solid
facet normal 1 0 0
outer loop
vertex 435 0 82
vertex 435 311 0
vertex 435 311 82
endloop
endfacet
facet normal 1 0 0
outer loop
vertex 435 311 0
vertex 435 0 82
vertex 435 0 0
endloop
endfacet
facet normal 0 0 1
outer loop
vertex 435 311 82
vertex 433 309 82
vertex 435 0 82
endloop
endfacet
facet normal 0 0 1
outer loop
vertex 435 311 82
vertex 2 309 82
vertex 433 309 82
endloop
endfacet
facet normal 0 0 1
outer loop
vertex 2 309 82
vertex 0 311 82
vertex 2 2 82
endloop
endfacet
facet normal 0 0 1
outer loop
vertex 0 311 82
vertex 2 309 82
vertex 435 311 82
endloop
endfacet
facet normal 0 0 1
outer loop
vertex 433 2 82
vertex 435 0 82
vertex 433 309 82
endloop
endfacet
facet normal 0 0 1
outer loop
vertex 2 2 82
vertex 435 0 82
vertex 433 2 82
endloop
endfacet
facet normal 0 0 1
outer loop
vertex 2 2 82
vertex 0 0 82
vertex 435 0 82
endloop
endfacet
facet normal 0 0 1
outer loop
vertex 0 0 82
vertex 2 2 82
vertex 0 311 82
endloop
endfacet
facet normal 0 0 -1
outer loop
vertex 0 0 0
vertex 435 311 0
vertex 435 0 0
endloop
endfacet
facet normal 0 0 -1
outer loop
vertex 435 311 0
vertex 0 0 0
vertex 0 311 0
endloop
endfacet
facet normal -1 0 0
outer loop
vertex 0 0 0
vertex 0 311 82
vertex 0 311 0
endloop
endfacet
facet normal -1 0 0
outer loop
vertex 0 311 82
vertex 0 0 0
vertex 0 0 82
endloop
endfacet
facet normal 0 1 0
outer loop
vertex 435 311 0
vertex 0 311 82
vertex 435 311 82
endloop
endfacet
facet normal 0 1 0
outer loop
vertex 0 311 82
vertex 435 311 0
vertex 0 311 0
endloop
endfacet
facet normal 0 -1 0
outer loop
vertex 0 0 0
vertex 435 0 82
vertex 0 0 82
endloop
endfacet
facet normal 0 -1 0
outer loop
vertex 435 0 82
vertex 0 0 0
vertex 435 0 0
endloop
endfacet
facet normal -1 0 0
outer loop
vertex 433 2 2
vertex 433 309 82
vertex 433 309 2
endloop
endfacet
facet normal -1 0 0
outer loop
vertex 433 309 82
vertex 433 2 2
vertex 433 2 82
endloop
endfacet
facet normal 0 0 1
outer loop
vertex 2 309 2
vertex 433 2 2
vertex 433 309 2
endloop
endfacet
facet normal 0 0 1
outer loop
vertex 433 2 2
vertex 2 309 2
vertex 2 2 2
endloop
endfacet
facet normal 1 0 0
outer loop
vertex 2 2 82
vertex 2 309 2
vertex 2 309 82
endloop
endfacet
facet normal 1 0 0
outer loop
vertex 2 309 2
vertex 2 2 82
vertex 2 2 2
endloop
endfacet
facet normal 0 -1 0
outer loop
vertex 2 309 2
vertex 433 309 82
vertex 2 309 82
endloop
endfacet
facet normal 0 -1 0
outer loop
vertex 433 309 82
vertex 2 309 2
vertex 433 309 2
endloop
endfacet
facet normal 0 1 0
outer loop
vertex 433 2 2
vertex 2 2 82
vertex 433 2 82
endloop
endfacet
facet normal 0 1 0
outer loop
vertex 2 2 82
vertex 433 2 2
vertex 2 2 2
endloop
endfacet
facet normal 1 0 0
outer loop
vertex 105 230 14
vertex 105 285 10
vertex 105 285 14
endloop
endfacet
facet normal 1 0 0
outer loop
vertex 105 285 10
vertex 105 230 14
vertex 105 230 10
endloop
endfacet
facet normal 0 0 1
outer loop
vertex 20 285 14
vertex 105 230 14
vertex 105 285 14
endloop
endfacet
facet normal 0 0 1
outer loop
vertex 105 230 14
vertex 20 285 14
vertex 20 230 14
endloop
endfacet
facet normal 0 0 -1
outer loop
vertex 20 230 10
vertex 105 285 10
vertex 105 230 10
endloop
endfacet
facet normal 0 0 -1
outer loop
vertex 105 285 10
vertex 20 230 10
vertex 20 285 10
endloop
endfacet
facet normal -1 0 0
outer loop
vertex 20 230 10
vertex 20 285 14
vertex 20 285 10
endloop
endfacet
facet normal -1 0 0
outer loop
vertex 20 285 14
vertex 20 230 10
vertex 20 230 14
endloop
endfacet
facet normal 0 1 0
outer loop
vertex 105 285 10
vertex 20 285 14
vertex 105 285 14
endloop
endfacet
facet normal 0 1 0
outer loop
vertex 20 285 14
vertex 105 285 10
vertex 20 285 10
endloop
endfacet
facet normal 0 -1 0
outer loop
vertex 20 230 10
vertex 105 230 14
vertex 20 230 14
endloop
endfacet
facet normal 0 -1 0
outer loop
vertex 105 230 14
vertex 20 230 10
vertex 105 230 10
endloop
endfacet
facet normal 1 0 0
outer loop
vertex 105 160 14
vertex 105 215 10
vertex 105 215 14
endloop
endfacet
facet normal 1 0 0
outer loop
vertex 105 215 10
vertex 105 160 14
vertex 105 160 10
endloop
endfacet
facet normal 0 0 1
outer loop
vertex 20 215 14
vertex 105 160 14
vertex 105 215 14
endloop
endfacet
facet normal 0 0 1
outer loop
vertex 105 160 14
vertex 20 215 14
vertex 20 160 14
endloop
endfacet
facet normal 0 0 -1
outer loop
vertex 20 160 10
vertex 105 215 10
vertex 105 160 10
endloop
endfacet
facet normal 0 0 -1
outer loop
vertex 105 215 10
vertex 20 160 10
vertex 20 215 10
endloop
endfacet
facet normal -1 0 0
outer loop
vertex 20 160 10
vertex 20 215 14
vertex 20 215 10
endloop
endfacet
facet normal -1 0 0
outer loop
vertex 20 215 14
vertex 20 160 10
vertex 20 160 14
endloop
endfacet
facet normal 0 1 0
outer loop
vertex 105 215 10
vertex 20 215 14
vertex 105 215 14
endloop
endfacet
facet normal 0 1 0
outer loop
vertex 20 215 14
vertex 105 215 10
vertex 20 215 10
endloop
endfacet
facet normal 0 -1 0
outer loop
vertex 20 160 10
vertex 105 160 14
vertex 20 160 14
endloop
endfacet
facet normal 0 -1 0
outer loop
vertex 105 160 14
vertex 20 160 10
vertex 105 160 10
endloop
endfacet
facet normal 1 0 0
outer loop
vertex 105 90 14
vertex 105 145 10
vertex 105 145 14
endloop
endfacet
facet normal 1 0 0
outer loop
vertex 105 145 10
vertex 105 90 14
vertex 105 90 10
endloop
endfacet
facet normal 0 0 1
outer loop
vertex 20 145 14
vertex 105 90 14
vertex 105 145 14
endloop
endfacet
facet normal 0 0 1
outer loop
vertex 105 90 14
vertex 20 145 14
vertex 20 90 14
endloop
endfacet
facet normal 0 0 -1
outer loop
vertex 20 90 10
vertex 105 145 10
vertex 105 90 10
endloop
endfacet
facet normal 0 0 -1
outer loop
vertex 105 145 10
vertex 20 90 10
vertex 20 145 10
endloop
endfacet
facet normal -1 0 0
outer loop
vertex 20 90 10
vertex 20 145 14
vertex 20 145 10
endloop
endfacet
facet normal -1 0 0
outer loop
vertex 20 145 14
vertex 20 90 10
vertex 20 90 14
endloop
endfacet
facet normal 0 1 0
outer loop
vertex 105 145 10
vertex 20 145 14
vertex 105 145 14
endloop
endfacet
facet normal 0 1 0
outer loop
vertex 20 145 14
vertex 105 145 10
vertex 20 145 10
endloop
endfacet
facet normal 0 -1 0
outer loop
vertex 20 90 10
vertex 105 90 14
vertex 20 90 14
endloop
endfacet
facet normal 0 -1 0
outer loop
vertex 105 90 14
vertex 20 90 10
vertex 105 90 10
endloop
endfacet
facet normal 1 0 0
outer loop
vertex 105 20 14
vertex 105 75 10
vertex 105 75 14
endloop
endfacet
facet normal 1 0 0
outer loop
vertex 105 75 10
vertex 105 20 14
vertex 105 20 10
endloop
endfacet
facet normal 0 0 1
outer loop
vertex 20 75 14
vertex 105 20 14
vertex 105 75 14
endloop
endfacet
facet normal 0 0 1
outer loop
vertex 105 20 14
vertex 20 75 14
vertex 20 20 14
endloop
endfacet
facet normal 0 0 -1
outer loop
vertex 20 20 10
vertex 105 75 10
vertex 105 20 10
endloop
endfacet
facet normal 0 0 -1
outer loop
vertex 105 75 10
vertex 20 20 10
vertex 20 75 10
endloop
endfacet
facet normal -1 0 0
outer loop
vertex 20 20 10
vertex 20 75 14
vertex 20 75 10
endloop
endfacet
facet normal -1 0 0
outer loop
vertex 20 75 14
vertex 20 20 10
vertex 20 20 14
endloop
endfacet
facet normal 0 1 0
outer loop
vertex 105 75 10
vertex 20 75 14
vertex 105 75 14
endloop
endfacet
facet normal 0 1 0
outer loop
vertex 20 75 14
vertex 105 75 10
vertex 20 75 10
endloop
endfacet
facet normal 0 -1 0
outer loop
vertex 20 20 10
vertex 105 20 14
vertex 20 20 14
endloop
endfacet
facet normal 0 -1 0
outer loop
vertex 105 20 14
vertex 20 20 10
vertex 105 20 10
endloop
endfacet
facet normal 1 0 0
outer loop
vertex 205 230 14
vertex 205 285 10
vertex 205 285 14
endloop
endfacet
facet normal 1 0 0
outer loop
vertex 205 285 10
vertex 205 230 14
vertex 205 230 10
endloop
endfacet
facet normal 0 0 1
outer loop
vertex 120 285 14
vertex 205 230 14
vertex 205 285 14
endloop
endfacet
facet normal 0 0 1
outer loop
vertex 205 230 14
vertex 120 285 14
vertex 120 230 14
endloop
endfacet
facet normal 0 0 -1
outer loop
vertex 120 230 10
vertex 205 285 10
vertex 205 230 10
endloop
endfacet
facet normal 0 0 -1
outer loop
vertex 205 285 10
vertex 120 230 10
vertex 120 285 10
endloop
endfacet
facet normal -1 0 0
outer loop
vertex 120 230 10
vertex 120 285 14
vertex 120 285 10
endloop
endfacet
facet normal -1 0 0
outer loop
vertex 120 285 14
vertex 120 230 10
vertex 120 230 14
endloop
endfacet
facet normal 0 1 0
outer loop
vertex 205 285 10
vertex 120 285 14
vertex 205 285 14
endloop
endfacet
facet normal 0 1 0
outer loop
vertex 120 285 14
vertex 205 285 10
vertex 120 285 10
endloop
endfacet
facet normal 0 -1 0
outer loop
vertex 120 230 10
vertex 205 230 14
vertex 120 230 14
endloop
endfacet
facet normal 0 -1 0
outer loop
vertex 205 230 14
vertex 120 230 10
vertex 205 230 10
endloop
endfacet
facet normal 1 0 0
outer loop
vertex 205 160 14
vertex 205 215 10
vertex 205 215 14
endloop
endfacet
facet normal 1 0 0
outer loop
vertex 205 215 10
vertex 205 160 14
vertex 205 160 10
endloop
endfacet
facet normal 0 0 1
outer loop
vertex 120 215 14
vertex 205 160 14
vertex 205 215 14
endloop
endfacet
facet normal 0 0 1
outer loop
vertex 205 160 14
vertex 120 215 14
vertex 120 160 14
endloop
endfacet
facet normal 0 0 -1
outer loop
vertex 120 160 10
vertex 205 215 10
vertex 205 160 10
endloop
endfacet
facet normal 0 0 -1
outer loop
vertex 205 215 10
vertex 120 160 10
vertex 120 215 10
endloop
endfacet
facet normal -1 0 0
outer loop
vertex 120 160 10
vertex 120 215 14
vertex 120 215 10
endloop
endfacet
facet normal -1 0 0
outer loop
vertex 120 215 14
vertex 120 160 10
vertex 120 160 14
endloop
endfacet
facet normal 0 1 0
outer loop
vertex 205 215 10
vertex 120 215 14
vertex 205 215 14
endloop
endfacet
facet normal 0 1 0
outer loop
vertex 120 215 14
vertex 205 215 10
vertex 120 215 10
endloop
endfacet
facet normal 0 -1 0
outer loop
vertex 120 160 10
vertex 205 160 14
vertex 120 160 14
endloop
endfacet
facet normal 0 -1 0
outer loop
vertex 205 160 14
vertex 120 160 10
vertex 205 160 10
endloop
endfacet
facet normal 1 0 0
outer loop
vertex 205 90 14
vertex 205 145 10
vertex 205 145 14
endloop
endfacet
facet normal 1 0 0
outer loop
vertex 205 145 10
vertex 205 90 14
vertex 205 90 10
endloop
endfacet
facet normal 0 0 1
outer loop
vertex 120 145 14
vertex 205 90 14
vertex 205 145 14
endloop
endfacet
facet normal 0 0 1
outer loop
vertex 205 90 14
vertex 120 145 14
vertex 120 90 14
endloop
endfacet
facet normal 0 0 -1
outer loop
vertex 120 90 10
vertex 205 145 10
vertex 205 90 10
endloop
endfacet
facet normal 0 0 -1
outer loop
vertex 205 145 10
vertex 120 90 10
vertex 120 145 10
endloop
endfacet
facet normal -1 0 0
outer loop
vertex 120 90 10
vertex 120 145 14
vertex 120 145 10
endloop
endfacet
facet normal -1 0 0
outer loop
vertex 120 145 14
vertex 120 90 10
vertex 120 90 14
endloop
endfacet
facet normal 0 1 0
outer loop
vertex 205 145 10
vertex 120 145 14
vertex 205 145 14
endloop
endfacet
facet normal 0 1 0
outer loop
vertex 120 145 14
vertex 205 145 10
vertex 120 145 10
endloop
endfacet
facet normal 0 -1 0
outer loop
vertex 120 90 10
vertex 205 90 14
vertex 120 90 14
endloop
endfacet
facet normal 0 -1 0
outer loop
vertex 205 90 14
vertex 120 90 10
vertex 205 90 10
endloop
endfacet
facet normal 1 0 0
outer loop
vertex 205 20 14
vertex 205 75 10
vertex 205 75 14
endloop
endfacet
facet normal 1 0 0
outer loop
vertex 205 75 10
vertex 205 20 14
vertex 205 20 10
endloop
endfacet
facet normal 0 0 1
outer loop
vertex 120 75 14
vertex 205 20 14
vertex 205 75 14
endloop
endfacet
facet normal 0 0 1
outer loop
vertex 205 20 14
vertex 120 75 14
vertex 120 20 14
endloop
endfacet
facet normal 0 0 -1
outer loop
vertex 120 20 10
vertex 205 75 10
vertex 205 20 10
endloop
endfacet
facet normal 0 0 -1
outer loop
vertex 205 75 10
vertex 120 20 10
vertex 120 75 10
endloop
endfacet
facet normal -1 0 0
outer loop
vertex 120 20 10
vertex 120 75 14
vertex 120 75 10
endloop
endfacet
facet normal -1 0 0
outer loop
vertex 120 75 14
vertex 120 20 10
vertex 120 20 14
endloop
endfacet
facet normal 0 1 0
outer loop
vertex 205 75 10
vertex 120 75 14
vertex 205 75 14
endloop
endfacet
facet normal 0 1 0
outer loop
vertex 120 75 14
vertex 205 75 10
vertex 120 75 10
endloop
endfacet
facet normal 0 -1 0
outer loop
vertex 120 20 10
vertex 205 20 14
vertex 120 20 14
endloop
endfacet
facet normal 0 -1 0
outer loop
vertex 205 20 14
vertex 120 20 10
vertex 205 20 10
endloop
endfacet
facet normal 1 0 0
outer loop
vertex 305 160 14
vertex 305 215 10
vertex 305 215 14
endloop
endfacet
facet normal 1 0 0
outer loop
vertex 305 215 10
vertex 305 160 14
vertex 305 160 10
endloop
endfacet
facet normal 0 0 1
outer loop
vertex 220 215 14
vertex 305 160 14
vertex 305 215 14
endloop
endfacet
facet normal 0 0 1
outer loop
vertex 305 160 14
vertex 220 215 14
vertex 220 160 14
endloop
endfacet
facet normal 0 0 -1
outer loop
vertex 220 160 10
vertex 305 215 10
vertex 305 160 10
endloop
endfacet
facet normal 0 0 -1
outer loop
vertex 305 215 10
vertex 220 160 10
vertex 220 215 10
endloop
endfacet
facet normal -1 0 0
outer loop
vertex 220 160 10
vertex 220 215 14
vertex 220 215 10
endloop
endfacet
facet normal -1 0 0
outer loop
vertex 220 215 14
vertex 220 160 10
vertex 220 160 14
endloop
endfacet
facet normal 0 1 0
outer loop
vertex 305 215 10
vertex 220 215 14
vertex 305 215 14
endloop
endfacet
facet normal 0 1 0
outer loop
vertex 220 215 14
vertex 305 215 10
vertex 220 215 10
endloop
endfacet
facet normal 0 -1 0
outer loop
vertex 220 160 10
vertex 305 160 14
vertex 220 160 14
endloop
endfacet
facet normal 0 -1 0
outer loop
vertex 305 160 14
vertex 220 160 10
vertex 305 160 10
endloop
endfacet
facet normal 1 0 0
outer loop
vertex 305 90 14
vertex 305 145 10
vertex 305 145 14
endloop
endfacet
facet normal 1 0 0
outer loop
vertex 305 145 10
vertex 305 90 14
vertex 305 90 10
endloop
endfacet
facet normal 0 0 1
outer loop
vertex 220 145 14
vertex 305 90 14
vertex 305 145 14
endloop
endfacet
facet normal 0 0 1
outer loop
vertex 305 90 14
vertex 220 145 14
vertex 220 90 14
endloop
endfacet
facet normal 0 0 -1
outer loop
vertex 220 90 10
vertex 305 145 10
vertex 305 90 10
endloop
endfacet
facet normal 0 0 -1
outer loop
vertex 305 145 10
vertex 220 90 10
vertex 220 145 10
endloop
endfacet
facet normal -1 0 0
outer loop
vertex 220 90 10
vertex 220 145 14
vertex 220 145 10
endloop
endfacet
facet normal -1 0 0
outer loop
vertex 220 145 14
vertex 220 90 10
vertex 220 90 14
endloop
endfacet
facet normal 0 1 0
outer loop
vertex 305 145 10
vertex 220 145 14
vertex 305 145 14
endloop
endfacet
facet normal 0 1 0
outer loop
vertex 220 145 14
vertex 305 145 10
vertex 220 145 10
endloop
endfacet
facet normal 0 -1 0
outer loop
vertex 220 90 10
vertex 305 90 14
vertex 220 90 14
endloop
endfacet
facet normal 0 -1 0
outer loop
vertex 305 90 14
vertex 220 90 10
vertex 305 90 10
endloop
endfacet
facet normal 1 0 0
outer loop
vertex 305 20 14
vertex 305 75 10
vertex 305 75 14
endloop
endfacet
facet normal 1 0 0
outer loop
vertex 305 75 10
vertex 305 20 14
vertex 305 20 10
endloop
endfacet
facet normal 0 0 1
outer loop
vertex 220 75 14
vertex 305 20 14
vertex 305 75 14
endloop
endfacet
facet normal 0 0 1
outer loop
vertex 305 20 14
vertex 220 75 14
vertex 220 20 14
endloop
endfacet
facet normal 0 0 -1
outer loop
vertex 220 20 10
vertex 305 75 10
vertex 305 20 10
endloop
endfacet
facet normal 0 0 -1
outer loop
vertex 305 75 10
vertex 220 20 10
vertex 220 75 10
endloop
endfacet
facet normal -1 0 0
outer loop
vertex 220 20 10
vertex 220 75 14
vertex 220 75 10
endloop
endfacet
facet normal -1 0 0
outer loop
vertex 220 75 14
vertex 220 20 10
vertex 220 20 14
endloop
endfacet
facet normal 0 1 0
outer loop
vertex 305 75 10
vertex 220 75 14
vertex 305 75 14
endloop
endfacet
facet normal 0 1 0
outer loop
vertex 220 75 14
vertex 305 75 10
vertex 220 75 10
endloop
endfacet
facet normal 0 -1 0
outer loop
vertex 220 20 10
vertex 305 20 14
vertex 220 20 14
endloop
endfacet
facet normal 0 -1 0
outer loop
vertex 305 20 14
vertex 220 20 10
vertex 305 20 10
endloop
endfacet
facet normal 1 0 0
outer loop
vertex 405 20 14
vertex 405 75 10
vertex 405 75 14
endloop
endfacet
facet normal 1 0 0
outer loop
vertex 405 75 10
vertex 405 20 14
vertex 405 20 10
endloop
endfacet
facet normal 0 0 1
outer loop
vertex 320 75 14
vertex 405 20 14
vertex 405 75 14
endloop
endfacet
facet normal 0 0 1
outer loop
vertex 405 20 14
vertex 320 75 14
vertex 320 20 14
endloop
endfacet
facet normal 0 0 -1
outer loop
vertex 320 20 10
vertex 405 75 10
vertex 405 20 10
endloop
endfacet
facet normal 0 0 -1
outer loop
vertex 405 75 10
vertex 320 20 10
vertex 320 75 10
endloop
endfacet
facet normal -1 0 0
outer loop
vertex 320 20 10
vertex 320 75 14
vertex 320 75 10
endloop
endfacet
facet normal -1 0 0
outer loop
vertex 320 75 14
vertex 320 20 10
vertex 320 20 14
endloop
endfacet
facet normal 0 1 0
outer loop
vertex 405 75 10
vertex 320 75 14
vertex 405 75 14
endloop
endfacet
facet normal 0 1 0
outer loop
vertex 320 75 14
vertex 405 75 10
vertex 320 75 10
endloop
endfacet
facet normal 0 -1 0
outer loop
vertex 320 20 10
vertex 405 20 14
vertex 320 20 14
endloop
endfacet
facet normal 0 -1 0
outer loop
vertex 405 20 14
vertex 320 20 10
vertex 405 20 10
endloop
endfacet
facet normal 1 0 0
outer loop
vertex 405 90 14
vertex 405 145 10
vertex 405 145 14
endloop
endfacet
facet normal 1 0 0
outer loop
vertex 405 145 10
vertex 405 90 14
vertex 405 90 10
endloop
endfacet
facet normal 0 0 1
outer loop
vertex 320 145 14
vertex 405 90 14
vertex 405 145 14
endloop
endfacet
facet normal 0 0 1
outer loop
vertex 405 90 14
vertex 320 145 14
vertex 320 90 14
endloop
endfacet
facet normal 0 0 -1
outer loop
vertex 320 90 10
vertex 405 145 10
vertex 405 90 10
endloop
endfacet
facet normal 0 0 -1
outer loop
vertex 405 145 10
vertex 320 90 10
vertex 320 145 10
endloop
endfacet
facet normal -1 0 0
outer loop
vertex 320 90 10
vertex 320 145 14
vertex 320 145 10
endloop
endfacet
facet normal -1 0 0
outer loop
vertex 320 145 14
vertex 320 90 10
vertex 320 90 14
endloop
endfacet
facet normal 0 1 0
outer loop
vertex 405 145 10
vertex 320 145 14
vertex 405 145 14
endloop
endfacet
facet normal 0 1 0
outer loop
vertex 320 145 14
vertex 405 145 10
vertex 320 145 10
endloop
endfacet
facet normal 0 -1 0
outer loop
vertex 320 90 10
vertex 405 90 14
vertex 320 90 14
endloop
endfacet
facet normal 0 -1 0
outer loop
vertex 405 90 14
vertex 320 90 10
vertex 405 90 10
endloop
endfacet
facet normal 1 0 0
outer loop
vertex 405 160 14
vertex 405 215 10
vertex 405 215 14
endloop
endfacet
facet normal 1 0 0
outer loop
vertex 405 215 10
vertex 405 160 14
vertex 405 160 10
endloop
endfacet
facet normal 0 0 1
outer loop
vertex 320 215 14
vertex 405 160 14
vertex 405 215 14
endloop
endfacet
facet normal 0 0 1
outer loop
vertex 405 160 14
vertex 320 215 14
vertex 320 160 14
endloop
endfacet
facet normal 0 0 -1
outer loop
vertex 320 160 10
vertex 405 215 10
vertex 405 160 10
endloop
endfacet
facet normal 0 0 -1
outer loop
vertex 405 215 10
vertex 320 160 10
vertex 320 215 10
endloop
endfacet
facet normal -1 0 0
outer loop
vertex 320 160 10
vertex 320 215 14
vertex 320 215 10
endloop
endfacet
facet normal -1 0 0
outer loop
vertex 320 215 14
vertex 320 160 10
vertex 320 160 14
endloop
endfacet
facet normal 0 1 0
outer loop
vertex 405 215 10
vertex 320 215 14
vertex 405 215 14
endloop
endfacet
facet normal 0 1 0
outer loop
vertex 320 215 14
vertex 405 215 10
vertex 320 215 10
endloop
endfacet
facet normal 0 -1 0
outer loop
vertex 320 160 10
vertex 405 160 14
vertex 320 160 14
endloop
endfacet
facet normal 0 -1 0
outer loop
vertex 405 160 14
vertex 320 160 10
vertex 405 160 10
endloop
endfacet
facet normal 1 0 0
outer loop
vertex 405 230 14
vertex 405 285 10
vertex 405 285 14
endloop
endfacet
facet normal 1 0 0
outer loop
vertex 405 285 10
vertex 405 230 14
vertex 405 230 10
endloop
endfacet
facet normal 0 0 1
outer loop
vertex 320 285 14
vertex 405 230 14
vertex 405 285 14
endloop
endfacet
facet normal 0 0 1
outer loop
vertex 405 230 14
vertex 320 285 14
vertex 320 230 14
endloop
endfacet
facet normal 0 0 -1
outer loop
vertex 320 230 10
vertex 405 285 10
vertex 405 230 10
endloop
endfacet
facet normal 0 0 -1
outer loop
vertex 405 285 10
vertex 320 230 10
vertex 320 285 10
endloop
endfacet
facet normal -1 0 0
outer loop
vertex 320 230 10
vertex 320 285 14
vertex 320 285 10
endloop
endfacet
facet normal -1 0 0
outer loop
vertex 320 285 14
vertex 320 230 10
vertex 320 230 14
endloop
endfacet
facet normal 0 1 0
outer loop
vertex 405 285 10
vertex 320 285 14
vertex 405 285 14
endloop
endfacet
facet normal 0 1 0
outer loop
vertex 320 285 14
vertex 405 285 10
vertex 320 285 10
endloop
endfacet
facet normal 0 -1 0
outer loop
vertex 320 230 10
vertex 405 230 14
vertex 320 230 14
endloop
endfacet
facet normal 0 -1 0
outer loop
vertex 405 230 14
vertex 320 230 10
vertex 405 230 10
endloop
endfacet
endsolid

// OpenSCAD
width = 435;
height = 82;
depth = 311;

margin_lr = 20;

$fn = 64;

difference() {
  cube( [ width, depth, height ] );
            
  translate( [ 2, 2, 2 ] ) {
    cube( [ width - 4, depth - 4, height + 10 ] );
  }
}

// Column One 

// PCM5142/DAC
translate( [ margin_lr, 220 + margin_lr - 10, 10 ] ) {
  color( "black" )
  cube( [ 85, 55, 4 ] );   
}

// DSP
translate( [ margin_lr, 150 + margin_lr - 10, 10 ] ) {
  color( "orange" )
  cube( [ 85, 55, 4 ] );   
}


// SPDIF (cyan)
translate( [ margin_lr, margin_lr + 70, 10 ] ) {
    color( "cyan" )
  cube( [ 85, 55, 4 ] );   
}


// Dolby
translate( [ margin_lr, margin_lr, 10 ] ) {
    color( "brown" )
  cube( [ 85, 55, 4 ] );   
}


// Column Two

// inputs (grey)
translate( [ 120, margin_lr + 210, 10 ] ) {
  color( "grey" )
  cube( [ 85, 55, 4 ] );   
}

// channel sel (Yellow)
translate( [ 120, margin_lr + 140, 10 ] ) {
  color( "yellow" )
  cube( [ 85, 55, 4 ] );   
}

// GPIO extender (blue)
translate( [ margin_lr + 100, margin_lr + 70, 10 ] ) {
  color( "#000080" )
  cube( [ 85, 55, 4 ] );   
}

// microprocessor
translate( [ margin_lr + 100, margin_lr, 10 ] ) {
  color( "brown" )
  cube( [ 85, 55, 4 ] );   
}

// Column Three

// vinyl (RED)
translate( [ 220, margin_lr + 140, 10 ] ) {
  color( "red" )
  cube( [ 85, 55, 4 ] );   
}

// ADC board (indigo)
translate( [ 220, margin_lr + 70, 10 ] ) {
  color( "pink" )
  cube( [ 85, 55, 4 ] );   
}

// FTDI (purple)
translate( [ 220, margin_lr, 10 ] ) {
  color( "purple" )
  cube( [ 85, 55, 4 ] );   
}

// Column Four

// Split Distributor
translate( [ 320, margin_lr, 10 ] ) {
  color( "indigo" )
  cube( [ 85, 55, 4 ] );   
}

// Monitor
translate( [ 320, margin_lr + 70, 10 ] ) {
  color( "orange" ) 
  cube( [ 85, 55, 4 ] );  
   
}

// Multi PSU
translate( [ 320, margin_lr + 140, 10 ] ) {
  color( "red" )
  cube( [ 85, 55, 4 ] );   
}


// Entry
translate( [ 320, margin_lr + 210, 10 ] ) {
  color( "white" )
  cube( [ 85, 55, 4 ] );   
}
